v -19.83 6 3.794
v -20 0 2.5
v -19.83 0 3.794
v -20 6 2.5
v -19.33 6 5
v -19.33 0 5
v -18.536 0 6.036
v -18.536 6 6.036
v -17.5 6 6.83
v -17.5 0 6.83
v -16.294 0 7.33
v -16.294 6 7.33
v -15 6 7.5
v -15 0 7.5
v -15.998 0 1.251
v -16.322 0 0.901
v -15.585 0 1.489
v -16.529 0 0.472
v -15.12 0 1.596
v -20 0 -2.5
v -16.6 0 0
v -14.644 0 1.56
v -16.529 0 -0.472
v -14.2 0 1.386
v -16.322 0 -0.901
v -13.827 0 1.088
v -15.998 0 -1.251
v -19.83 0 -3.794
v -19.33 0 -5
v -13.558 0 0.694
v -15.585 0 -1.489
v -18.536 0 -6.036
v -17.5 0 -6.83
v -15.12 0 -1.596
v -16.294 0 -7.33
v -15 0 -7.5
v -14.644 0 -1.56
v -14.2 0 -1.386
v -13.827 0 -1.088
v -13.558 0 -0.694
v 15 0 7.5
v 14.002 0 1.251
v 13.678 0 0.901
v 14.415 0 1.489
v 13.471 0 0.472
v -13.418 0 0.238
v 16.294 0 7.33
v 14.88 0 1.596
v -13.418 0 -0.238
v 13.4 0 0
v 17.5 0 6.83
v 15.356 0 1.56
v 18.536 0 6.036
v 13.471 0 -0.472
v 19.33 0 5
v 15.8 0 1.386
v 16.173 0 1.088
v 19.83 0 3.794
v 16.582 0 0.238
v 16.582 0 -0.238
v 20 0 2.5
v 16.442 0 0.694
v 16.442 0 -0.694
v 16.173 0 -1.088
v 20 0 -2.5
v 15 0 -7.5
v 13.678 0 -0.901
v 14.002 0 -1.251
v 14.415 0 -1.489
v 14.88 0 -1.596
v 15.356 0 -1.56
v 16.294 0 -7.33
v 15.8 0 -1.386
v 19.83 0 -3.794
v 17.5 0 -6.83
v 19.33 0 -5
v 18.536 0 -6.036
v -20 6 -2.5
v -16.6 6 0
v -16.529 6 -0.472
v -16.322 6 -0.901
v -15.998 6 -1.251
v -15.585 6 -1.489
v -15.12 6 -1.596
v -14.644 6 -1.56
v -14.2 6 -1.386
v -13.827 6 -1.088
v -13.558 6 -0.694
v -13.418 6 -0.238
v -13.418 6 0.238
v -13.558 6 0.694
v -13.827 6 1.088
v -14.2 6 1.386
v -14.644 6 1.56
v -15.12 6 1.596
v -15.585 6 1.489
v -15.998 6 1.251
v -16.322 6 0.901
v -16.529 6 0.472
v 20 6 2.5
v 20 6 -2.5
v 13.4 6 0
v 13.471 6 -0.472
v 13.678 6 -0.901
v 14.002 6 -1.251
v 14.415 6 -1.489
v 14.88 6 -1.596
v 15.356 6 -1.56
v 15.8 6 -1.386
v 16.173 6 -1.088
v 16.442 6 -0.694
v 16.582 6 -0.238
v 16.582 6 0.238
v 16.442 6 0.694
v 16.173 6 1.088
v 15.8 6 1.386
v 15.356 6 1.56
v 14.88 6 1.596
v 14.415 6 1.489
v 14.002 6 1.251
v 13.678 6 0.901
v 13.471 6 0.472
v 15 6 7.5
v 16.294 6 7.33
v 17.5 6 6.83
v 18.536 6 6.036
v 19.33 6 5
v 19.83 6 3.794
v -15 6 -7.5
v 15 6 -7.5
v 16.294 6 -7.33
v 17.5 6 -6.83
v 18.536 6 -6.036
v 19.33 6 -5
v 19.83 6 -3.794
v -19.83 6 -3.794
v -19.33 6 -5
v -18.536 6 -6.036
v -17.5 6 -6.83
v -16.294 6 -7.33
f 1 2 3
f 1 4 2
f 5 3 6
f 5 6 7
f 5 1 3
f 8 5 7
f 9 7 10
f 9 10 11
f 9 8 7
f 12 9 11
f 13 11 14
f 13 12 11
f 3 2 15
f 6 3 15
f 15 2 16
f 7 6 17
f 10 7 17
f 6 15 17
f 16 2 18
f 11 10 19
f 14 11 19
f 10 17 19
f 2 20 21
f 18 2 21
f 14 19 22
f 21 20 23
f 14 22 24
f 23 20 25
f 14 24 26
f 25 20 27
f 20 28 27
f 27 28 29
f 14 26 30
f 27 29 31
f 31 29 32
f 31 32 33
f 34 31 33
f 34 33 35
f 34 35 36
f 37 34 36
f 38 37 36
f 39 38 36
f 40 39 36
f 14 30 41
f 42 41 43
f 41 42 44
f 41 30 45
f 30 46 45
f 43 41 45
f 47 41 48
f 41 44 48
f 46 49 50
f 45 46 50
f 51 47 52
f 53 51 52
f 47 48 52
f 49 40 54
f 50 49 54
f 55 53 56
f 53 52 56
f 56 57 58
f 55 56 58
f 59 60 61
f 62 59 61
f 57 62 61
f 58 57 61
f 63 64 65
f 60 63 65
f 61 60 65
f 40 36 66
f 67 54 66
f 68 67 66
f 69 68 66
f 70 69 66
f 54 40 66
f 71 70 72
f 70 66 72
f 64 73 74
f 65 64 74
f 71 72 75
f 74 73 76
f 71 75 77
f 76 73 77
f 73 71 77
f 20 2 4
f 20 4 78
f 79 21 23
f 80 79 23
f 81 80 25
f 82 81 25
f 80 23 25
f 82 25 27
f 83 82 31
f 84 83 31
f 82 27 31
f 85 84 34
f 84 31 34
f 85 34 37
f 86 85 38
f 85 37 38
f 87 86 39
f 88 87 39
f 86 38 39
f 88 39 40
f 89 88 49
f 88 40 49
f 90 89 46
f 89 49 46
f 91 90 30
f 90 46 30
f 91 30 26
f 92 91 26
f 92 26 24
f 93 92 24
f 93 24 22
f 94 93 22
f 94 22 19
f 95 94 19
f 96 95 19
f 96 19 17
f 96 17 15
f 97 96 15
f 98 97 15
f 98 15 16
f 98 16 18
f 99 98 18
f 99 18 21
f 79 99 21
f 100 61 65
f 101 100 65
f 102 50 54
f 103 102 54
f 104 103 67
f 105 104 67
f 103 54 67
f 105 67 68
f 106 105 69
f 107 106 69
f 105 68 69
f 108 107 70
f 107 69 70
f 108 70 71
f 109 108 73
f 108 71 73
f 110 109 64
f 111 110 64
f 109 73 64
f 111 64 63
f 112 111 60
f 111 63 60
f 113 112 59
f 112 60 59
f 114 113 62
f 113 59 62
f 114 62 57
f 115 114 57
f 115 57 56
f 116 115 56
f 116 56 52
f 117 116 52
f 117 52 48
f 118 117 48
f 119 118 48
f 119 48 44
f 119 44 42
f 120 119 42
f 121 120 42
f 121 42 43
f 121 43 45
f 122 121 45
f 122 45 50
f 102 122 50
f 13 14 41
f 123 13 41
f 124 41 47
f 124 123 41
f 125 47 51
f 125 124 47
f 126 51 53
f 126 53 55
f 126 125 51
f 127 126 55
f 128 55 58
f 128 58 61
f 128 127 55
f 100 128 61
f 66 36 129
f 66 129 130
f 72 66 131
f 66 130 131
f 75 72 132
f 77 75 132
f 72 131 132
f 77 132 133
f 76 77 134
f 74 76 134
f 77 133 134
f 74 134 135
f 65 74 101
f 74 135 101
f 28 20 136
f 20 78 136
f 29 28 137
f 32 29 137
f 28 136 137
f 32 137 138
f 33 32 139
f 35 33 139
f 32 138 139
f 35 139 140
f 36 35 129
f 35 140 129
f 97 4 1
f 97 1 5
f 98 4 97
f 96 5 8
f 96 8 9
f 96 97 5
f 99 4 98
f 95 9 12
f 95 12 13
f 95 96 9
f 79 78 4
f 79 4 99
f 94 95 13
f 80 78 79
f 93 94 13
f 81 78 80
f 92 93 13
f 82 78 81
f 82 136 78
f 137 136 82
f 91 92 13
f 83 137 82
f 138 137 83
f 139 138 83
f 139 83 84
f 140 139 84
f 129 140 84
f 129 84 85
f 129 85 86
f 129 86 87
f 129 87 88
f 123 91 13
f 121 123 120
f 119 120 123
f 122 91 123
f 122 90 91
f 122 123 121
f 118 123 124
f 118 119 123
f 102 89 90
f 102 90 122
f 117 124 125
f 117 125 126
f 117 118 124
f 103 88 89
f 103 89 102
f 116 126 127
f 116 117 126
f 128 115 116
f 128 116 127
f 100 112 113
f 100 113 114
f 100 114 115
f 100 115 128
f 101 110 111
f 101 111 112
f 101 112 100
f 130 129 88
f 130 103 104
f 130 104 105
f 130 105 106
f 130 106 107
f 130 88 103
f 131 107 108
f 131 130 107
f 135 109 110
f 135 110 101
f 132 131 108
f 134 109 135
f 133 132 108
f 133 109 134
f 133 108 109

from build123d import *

# Parameters (mm, degrees)
SKETCH1_W            = 40
SKETCH1_H            = 15
BOSS_EXTRUDE1_DEPTH  = 6
M3_CLEARANCE_HOLE1_D = 3.2
FILLET1_R            = 5


with BuildPart() as part:
    # Sketch1 → Boss-Extrude1 (new body)
    with BuildSketch(Plane(origin=(0, 0, 0), x_dir=(1, 0, 0), z_dir=(0, 1, 0))):
        Rectangle(SKETCH1_W, SKETCH1_H)
    extrude(amount=BOSS_EXTRUDE1_DEPTH)

    # M3 Clearance Hole1 (through all)
    with Locations(Plane(origin=(0, 6, 0), x_dir=(1, 0, 0), z_dir=(0, 1, 0))):
        with Locations((-15, 0), (15, 0)):
            Hole(M3_CLEARANCE_HOLE1_D / 2)

    # Fillet1
    fillet1_edges = [part.edges().sort_by_distance(p)[0] for p in [
        (20, 3, 7.5),
        (-20, 3, 7.5),
        (-20, 3, -7.5),
        (20, 3, -7.5),
    ]]
    fillet(fillet1_edges, radius=FILLET1_R)


solid = part.part
